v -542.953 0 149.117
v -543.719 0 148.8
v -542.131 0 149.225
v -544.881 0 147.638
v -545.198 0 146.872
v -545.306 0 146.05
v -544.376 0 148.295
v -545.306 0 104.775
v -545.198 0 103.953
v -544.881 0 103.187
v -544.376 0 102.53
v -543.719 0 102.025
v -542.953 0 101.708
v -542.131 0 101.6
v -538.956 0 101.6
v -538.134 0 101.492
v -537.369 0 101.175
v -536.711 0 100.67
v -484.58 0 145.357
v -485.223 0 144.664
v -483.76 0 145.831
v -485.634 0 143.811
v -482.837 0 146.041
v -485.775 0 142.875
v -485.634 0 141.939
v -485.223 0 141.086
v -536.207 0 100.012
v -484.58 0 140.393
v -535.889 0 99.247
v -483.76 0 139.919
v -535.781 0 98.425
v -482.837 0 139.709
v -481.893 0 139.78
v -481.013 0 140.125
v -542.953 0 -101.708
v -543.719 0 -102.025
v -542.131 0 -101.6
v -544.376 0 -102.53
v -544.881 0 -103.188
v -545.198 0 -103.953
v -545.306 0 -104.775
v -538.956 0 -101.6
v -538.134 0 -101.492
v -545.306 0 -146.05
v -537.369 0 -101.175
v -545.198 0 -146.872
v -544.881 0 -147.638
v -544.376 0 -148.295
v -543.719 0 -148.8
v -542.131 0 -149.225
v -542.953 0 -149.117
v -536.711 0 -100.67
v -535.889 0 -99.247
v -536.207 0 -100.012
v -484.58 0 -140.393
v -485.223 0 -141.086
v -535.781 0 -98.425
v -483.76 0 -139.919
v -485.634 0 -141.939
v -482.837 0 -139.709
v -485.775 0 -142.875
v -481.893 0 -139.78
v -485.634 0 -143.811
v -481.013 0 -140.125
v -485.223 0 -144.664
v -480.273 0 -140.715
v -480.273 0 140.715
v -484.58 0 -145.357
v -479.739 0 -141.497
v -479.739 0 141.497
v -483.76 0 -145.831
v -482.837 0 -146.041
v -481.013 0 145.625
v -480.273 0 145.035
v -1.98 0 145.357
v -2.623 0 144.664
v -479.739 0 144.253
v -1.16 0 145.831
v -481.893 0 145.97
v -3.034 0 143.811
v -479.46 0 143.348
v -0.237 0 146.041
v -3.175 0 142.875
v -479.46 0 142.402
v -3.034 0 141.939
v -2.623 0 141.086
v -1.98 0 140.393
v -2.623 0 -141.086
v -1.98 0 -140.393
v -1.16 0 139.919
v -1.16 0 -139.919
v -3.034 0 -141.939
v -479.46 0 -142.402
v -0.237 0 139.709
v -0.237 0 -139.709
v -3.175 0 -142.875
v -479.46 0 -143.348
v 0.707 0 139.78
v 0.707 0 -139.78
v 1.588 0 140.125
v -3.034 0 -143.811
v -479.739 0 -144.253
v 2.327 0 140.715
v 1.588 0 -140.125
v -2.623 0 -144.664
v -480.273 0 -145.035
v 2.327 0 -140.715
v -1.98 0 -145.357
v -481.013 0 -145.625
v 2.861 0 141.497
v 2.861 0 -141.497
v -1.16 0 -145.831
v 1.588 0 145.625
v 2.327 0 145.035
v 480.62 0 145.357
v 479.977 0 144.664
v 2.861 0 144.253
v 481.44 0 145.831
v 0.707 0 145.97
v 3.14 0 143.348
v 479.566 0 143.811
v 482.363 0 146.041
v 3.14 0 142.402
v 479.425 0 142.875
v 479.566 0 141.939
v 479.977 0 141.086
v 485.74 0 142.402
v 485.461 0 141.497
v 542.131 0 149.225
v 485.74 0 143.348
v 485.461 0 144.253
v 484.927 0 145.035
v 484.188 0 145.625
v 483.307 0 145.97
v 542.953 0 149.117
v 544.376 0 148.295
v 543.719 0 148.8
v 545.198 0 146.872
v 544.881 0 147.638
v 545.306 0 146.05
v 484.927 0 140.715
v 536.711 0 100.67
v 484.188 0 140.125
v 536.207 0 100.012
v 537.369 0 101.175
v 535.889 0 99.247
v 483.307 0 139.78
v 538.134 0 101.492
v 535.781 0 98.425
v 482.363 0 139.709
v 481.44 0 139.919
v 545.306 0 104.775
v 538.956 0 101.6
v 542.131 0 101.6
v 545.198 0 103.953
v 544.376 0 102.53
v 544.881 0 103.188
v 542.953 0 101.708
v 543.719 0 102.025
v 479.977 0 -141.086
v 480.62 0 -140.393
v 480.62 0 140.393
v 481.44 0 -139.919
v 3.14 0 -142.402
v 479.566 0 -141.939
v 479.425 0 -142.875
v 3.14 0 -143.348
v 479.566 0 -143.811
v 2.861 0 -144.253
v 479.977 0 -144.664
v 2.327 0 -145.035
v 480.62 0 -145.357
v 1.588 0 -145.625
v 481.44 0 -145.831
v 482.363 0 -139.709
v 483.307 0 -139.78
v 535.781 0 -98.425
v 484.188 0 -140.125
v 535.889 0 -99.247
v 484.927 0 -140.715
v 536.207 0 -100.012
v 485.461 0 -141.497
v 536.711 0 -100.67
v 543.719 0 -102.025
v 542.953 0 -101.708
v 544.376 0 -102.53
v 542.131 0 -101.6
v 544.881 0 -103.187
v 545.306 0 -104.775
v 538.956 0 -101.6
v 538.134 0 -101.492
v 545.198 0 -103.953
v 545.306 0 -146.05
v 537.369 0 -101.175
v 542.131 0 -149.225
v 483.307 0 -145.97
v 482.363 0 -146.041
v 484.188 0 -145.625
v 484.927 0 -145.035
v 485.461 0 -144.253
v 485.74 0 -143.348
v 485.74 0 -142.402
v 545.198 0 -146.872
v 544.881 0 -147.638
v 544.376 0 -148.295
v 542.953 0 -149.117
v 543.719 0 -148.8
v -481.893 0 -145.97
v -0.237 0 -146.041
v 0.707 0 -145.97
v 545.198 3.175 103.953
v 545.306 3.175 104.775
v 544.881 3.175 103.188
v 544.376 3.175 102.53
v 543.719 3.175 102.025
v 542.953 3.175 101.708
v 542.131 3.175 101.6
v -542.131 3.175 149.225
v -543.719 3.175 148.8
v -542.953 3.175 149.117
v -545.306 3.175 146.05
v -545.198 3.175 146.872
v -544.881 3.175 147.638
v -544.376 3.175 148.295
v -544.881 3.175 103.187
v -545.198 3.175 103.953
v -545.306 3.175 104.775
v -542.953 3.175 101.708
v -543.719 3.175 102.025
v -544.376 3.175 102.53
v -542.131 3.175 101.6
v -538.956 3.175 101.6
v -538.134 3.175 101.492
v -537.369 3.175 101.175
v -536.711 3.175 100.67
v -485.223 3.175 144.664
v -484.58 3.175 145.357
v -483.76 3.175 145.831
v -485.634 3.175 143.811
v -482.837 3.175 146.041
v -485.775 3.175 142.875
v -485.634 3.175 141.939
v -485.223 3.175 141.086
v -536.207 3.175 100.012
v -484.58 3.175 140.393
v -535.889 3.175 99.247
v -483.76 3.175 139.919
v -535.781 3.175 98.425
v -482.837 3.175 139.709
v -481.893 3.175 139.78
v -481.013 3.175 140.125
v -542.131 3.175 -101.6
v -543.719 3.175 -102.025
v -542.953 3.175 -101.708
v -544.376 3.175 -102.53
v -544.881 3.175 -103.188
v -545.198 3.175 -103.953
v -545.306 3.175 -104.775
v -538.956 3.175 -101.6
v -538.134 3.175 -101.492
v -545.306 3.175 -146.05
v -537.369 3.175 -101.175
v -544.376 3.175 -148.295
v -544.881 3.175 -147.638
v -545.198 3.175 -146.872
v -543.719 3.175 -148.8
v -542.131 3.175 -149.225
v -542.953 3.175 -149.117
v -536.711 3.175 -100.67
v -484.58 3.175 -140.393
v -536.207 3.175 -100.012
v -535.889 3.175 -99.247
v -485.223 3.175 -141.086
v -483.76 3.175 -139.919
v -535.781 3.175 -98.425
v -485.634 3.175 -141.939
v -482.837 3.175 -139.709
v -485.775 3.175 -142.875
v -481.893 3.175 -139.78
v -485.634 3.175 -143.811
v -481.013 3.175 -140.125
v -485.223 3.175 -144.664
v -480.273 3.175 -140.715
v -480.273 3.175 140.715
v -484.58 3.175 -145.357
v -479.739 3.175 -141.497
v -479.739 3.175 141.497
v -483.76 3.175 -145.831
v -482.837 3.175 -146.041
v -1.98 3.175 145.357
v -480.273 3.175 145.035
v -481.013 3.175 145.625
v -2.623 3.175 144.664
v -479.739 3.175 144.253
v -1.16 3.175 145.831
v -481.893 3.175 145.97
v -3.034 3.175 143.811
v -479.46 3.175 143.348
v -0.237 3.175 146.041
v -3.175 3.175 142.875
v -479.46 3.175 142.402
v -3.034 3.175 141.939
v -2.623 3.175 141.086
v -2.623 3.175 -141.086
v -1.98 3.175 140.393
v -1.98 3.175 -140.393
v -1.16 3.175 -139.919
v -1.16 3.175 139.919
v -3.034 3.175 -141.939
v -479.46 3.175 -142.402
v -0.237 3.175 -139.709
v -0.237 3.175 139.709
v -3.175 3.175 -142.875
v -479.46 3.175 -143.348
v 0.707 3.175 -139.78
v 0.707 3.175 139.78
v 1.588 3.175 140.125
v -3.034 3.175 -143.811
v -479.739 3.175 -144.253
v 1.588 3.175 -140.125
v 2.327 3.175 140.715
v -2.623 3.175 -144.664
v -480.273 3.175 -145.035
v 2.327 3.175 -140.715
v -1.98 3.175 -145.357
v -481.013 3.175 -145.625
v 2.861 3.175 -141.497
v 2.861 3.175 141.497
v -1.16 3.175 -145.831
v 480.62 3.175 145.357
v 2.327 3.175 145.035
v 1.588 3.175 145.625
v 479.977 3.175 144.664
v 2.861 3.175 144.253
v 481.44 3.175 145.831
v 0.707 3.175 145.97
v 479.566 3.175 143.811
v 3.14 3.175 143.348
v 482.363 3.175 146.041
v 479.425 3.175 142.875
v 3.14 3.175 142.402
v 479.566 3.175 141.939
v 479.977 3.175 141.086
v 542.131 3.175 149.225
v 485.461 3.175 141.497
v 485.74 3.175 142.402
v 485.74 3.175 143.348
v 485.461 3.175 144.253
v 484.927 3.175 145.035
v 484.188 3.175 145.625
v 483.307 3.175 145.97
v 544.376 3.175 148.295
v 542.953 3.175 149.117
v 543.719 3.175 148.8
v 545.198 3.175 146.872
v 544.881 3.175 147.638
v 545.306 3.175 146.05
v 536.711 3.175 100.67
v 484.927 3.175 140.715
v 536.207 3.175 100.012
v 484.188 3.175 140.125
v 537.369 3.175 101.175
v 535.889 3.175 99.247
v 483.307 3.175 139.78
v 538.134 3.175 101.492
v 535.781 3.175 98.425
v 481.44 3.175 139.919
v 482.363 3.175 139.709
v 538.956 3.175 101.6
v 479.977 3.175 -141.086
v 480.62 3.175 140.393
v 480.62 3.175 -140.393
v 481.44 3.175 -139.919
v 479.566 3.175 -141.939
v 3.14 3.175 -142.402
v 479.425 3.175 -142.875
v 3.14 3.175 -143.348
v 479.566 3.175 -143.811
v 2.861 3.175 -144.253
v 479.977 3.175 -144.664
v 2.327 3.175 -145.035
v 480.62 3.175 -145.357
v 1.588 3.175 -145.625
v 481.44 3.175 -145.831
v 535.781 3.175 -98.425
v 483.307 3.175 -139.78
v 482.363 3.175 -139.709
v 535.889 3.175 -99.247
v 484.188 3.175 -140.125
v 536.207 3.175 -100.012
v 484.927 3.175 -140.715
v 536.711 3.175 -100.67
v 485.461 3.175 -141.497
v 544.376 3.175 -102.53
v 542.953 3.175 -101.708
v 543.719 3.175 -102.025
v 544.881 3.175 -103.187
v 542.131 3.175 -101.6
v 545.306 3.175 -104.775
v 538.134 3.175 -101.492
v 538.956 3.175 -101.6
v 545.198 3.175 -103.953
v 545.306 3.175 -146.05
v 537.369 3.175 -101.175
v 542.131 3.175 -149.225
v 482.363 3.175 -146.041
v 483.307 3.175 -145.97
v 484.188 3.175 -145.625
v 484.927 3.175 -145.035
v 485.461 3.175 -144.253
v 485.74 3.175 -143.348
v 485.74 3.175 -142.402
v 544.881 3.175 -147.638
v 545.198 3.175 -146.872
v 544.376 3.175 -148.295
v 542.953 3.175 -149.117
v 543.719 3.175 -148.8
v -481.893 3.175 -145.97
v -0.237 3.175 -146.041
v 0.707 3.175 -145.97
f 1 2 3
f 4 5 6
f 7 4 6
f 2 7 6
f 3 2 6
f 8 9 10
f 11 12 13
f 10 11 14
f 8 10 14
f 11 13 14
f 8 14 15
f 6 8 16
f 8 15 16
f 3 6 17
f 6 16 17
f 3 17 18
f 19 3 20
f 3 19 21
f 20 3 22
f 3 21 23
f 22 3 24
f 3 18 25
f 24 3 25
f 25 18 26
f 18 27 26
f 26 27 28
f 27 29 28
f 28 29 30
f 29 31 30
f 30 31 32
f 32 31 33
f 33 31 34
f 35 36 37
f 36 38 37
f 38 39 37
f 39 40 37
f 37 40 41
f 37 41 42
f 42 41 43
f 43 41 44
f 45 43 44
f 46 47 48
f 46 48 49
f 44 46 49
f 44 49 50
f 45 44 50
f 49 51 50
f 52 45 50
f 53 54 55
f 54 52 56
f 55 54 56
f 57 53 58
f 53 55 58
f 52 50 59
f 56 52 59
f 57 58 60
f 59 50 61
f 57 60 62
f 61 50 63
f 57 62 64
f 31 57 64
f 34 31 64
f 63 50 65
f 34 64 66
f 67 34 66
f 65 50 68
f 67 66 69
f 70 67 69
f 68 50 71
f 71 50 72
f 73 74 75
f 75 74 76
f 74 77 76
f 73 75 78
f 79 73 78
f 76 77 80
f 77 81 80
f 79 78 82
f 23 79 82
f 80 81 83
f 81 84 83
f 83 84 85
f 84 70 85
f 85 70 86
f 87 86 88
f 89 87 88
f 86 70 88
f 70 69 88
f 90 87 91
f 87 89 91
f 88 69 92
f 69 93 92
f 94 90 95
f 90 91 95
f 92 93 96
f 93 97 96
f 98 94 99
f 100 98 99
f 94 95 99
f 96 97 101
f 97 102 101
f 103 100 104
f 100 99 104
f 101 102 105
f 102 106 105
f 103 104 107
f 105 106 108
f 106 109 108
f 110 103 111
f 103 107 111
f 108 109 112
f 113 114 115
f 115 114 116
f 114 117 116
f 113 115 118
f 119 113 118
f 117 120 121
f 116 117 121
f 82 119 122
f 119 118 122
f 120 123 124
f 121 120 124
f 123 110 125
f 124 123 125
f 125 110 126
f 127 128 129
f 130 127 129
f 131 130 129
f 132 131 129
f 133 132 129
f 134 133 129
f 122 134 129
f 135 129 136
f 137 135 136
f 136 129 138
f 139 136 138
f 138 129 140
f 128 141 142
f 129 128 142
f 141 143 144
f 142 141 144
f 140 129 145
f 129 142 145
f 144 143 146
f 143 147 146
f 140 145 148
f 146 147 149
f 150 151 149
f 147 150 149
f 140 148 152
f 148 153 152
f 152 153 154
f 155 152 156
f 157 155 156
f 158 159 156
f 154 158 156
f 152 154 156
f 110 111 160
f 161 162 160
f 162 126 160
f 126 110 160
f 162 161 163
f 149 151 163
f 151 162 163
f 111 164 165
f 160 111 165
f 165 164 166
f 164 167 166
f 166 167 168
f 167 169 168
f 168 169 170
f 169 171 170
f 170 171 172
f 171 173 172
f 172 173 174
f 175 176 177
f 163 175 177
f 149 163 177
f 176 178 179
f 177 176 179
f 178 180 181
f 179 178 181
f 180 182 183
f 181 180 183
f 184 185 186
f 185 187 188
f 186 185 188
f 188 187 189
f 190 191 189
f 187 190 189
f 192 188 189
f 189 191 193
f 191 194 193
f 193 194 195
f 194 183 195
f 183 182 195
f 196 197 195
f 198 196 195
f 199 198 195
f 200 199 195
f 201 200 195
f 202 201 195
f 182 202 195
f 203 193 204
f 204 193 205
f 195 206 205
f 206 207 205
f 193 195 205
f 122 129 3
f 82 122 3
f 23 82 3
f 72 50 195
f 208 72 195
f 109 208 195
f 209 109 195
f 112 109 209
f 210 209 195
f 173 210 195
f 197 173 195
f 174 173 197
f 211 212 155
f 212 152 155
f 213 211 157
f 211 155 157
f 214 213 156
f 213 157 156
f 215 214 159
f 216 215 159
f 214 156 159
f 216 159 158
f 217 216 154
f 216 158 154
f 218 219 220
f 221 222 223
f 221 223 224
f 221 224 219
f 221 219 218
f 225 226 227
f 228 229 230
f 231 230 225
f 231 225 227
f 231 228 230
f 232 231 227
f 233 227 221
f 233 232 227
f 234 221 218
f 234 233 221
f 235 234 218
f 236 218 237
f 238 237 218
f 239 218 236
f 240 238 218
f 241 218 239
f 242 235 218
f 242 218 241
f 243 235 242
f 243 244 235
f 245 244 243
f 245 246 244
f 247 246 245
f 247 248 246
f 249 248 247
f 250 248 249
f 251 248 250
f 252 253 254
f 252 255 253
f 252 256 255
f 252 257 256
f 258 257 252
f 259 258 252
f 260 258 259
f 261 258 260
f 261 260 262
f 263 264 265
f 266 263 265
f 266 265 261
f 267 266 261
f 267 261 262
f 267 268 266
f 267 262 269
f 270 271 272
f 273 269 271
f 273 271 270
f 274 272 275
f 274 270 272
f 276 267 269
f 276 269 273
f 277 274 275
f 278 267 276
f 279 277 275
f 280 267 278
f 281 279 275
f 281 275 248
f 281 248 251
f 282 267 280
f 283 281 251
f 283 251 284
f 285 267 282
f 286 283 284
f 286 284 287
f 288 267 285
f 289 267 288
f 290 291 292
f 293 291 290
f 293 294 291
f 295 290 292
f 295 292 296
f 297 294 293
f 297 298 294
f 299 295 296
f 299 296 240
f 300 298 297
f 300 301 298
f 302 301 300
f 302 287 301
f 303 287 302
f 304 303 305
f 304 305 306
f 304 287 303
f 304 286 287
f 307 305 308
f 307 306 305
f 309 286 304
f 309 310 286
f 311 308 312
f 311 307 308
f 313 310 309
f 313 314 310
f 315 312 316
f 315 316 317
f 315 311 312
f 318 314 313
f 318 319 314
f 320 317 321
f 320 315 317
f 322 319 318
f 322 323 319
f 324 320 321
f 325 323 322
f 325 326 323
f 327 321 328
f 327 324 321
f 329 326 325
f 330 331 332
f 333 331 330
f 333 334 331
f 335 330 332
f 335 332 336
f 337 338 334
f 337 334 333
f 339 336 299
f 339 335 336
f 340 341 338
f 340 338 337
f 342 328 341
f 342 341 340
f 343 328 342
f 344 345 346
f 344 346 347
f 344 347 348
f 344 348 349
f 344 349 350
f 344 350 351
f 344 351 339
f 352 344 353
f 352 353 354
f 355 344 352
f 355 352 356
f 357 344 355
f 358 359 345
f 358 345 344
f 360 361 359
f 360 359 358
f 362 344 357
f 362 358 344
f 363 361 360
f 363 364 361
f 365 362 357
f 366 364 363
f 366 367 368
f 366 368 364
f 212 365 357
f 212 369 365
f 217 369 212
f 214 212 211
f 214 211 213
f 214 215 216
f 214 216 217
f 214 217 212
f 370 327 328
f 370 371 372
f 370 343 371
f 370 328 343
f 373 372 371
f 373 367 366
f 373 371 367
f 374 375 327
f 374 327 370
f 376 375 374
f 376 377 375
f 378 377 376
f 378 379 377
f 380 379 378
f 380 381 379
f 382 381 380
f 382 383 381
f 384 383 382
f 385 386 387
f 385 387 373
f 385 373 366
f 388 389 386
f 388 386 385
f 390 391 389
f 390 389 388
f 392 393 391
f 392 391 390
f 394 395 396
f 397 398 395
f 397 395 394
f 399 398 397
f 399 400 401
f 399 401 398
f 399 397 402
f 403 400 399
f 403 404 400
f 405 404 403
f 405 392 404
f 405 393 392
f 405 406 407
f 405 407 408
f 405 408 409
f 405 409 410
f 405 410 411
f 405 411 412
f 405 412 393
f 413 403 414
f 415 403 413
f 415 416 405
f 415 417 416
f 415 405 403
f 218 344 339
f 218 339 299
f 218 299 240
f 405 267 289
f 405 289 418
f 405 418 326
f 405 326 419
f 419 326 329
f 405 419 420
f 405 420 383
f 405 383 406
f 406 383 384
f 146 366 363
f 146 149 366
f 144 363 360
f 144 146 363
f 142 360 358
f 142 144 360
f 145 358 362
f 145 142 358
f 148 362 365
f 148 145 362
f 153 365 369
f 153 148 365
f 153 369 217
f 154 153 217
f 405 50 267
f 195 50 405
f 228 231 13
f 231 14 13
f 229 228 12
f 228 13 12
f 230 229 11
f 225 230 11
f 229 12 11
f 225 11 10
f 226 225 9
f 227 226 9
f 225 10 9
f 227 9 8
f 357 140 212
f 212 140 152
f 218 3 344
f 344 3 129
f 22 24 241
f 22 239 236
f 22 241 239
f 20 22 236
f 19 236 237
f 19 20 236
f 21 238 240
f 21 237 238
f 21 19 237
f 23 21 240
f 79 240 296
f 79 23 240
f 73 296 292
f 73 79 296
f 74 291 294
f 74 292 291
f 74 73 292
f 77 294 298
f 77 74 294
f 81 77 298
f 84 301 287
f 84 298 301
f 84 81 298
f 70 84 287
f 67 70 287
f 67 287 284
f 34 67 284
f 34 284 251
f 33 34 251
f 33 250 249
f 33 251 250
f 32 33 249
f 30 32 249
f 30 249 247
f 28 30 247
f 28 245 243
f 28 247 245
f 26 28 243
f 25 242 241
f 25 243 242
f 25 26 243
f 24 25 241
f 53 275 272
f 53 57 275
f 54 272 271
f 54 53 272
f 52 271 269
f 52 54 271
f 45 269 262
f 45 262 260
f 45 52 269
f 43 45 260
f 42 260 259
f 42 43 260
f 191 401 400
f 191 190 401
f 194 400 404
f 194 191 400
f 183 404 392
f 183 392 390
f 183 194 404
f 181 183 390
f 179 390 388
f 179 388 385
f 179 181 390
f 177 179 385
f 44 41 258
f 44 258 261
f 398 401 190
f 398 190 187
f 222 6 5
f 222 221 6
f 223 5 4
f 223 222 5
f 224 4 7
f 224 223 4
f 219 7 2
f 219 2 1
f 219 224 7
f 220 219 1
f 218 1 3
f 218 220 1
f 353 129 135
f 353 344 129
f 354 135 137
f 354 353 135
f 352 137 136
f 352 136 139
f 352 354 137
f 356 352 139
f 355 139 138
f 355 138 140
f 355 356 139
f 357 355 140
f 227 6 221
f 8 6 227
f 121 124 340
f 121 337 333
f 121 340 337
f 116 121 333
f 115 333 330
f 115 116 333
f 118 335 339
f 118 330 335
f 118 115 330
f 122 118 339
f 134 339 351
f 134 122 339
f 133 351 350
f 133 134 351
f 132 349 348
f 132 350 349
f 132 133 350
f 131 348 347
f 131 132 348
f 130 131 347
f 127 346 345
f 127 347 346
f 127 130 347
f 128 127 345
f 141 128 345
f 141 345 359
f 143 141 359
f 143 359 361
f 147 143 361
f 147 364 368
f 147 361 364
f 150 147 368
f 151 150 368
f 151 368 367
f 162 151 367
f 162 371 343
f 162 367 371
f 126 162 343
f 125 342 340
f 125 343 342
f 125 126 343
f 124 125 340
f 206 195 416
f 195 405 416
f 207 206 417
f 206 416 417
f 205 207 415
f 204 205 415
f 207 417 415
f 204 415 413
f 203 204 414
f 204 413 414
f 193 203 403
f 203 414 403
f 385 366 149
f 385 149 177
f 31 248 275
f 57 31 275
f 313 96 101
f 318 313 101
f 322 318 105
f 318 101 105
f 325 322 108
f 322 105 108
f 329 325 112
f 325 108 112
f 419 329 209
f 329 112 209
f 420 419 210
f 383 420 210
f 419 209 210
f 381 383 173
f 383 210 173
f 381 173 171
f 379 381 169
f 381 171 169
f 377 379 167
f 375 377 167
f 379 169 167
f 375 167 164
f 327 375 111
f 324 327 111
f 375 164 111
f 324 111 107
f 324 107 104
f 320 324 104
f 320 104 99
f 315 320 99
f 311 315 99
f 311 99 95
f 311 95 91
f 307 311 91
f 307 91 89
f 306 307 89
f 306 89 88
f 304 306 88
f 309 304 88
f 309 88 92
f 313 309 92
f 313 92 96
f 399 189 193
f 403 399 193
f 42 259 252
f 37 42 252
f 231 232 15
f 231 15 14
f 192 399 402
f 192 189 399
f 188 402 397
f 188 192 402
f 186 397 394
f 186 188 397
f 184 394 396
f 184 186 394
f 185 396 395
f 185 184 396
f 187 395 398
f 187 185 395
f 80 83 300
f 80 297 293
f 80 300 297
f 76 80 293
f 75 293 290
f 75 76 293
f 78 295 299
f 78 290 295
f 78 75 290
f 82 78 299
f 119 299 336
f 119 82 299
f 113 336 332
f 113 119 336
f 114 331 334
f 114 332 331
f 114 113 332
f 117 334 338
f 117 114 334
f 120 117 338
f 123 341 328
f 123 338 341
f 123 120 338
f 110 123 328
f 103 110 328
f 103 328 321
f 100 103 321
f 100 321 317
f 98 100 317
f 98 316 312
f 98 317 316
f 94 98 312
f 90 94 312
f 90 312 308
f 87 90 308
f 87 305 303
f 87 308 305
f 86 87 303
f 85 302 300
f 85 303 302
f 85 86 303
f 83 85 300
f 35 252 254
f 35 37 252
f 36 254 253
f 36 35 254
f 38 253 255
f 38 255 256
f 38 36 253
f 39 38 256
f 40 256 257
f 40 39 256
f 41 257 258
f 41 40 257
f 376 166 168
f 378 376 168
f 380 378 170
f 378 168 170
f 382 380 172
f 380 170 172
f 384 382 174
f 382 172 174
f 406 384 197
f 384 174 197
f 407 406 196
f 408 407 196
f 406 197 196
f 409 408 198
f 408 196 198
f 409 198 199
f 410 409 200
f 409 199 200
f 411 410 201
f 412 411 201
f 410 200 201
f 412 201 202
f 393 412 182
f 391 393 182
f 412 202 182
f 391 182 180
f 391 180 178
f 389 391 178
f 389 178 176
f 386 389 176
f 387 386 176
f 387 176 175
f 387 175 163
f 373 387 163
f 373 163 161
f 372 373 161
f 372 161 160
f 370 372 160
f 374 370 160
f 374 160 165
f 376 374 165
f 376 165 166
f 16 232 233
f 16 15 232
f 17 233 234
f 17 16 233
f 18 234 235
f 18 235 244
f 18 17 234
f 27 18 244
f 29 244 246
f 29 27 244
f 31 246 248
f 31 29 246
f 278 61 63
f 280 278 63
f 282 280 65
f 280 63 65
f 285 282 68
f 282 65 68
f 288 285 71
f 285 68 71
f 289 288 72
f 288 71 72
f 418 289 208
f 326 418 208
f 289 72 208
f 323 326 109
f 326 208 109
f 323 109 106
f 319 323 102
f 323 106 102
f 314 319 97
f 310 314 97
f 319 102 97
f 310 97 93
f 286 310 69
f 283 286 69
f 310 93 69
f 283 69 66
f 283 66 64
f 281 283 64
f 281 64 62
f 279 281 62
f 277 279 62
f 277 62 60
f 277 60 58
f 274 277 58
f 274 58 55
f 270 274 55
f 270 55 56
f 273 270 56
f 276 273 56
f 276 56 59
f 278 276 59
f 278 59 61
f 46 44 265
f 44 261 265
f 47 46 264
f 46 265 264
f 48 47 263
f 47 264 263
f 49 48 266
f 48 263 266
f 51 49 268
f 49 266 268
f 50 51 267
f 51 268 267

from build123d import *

# Parameters (mm, degrees)
SKETCH1_W                   = 1090.6125
SKETCH1_H                   = 298.45
BOSS_EXTRUDE1_DEPTH         = 3.175
SKETCH2_W                   = 9.525
SKETCH2_H                   = 203.2
CUT_EXTRUDE1_DEPTH          = 4.175
FILLET1_R                   = 3.175
FILLET1_OF_MIRROR1_R        = 3.175
F_1_4_0_25_DIAMETER_HOLE1_D = 6.35
FILLET2_R                   = 3.175


with BuildPart() as part:
    # Sketch1 → Boss-Extrude1 (new body)
    with BuildSketch(Plane(origin=(0, 0, 0), x_dir=(1, 0, 0), z_dir=(0, 1, 0))):
        Rectangle(SKETCH1_W, SKETCH1_H)
    extrude(amount=BOSS_EXTRUDE1_DEPTH)

    # Sketch2 → Cut-Extrude1 (cut, through all)
    with BuildSketch(Plane(origin=(0, 3.175, 0), x_dir=(1, 0, 0), z_dir=(0, 1, 0))):
        with Locations((540.54375, 0)):
            Rectangle(SKETCH2_W, SKETCH2_H)
    cut_extrude1 = extrude(amount=-CUT_EXTRUDE1_DEPTH, mode=Mode.SUBTRACT)

    # Fillet1
    fillet1_edges = [part.edges().sort_by_distance(p)[0] for p in [
        (535.78125, 1.5875, 101.6),
        (535.78125, 1.5875, -101.6),
    ]]
    fillet(fillet1_edges, radius=FILLET1_R)

    # Mirror1: Cut-Extrude1 across plane
    add(cut_extrude1.mirror(Plane(origin=(0, 0, 0), x_dir=(0, 0, 1), z_dir=(1, 0, 0))), mode=Mode.SUBTRACT)

    # Fillet1 of Mirror1
    fillet1_of_mirror1_edges = [part.edges().sort_by_distance(p)[0] for p in [
        (-535.78125, 1.5875, 101.6),
        (-535.78125, 1.5875, -101.6),
    ]]
    fillet(fillet1_of_mirror1_edges, radius=FILLET1_OF_MIRROR1_R)

    # 1/4 (0.25) Diameter Hole1 (through all)
    with Locations(Plane(origin=(0, 3.175, 0), x_dir=(1, 0, 0), z_dir=(0, 1, 0))):
        with Locations((482.6, 142.875), (0, 142.875), (-482.6, 142.875)):
            f_1_4_0_25_diameter_hole1 = Hole(F_1_4_0_25_DIAMETER_HOLE1_D / 2)

    # Mirror2: 1/4 (0.25) Diameter Hole1 across plane
    add(f_1_4_0_25_diameter_hole1.mirror(Plane.XY), mode=Mode.SUBTRACT)

    # Fillet2
    fillet2_edges = [part.edges().sort_by_distance(p)[0] for p in [
        (545.30625, 1.5875, -101.6),
        (545.30625, 1.5875, 101.6),
        (-545.30625, 1.5875, 101.6),
        (-545.30625, 1.5875, -101.6),
        (545.30625, 1.5875, 149.225),
        (-545.30625, 1.5875, 149.225),
        (-545.30625, 1.5875, -149.225),
        (545.30625, 1.5875, -149.225),
    ]]
    fillet(fillet2_edges, radius=FILLET2_R)


solid = part.part
